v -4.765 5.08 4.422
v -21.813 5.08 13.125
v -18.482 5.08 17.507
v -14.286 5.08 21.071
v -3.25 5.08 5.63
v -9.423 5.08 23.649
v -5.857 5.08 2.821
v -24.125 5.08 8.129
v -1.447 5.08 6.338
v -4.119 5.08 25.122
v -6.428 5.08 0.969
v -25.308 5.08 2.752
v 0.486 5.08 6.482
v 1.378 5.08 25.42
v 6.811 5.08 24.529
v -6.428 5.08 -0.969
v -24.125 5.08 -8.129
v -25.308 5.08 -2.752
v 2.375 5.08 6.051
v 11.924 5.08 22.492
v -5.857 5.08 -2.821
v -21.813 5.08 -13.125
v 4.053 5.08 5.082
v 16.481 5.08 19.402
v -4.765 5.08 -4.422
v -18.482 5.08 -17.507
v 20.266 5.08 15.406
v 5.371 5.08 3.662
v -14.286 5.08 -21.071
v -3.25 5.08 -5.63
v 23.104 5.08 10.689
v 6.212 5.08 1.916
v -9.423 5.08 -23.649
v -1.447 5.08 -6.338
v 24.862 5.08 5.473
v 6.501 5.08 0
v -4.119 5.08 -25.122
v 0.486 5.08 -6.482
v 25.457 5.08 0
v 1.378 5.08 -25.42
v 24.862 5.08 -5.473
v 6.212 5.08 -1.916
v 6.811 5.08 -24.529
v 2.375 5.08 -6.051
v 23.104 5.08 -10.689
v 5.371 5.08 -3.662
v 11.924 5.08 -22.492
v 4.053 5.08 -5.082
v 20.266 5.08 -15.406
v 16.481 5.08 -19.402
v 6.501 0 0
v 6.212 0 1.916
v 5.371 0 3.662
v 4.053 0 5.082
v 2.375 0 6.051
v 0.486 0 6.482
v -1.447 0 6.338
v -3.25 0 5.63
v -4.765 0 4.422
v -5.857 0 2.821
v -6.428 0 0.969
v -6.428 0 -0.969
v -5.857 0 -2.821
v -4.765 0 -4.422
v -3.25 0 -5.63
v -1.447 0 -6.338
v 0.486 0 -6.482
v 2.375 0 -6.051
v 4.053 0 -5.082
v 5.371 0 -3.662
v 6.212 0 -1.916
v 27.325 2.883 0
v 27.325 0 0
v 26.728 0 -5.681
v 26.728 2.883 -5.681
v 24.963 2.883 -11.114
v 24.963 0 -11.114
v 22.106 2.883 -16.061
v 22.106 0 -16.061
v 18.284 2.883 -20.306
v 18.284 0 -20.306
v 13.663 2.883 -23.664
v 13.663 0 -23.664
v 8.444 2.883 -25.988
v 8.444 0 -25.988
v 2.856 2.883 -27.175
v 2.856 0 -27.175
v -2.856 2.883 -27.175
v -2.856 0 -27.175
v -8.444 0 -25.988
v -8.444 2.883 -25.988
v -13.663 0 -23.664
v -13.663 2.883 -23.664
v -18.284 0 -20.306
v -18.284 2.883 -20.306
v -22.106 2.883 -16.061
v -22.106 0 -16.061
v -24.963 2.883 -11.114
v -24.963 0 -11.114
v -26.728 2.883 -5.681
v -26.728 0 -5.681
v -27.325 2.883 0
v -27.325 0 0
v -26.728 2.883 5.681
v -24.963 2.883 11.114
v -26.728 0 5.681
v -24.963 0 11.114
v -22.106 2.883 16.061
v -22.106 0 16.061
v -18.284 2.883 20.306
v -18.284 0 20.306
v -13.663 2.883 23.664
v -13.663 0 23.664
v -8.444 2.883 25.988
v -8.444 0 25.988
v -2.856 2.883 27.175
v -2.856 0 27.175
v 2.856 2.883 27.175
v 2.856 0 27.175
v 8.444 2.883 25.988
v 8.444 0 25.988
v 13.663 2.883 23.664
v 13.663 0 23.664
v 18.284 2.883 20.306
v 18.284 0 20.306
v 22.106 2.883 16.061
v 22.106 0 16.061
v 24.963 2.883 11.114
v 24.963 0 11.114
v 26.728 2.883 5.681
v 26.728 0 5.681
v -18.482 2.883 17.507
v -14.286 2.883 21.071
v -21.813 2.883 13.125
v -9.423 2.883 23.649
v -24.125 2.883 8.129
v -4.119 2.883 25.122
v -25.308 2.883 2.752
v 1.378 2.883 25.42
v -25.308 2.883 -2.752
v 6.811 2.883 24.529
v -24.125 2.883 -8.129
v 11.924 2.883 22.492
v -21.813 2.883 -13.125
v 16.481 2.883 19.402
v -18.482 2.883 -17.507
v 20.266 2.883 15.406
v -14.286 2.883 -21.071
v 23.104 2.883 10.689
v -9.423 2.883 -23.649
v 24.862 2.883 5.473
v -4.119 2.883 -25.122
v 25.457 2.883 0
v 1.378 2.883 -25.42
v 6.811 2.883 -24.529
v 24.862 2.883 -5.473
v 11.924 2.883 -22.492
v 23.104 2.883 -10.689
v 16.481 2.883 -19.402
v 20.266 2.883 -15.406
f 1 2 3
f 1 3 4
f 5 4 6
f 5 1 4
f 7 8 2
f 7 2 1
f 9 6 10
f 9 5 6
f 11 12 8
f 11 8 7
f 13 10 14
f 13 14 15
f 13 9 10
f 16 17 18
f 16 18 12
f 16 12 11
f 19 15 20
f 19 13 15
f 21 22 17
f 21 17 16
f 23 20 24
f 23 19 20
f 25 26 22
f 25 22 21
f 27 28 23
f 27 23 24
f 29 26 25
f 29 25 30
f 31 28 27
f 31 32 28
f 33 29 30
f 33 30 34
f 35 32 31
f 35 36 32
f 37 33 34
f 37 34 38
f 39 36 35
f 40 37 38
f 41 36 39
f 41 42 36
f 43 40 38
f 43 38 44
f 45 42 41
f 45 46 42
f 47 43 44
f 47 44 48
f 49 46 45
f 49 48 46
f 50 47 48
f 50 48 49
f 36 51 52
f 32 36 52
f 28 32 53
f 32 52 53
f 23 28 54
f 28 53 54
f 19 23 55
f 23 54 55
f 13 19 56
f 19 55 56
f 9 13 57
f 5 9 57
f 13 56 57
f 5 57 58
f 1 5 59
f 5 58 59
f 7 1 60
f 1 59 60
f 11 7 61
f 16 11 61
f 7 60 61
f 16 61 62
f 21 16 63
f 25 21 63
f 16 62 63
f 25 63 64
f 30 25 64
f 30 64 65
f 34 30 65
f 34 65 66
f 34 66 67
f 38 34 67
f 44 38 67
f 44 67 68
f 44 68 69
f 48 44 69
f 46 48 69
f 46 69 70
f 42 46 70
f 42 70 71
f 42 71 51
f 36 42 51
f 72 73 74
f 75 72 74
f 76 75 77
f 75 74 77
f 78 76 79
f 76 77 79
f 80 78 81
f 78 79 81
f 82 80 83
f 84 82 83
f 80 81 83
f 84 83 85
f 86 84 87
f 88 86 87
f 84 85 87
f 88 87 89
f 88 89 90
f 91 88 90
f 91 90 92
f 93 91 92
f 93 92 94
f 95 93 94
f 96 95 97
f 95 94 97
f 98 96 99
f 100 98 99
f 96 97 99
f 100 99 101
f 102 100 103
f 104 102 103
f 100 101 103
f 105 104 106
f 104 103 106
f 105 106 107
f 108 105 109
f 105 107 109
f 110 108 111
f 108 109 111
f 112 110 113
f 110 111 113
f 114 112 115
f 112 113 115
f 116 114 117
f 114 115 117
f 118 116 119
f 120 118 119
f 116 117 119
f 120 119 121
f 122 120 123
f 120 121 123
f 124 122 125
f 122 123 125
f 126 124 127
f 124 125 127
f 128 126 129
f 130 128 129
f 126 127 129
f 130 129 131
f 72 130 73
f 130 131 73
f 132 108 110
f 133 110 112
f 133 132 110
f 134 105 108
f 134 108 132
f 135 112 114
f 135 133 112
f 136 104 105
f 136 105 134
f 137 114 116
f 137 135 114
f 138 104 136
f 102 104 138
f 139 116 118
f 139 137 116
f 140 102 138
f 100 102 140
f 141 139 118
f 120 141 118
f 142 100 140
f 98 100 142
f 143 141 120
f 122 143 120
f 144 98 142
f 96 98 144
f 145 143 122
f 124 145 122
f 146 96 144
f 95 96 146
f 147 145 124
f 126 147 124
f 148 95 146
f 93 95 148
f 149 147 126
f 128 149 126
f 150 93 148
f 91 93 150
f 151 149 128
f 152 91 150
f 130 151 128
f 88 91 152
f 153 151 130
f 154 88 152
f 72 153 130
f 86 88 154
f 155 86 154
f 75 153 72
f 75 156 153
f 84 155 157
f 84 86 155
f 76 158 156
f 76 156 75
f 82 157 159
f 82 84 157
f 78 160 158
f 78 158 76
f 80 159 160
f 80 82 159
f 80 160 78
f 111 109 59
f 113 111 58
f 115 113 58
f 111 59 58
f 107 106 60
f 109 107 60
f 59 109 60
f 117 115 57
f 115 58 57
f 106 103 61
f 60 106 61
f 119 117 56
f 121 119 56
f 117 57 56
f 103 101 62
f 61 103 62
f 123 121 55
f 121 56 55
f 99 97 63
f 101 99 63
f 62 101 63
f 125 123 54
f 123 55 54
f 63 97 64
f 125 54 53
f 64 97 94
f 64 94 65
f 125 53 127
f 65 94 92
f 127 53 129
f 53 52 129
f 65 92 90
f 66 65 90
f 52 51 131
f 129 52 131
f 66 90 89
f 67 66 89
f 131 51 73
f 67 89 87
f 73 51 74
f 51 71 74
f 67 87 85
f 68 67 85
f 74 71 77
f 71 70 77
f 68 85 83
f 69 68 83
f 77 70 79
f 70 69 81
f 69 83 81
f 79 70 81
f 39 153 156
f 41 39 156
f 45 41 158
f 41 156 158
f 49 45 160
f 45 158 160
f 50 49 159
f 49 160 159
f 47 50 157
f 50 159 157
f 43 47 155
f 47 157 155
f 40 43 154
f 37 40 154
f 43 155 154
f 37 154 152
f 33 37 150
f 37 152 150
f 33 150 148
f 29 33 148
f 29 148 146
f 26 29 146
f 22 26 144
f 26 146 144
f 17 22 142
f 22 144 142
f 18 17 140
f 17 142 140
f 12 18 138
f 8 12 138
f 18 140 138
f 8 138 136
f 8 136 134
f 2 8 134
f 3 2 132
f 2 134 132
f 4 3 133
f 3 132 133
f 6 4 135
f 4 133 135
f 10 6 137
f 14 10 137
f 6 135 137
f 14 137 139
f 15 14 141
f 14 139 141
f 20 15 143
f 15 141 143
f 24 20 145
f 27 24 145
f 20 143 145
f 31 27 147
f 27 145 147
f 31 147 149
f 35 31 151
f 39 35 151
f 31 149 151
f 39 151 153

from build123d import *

# Parameters (mm, degrees)
SKETCH1_R           = 27.325
BOSS_EXTRUDE1_DEPTH = 2.8829
SKETCH2_R           = 25.45715
BOSS_EXTRUDE2_DEPTH = 2.1971
SKETCH6_R           = 6.500596607
CUT_EXTRUDE1_DEPTH  = 25.4


with BuildPart() as part:
    # Sketch1 → Boss-Extrude1 (new body)
    with BuildSketch(Plane(origin=(0, 0, 0), x_dir=(1, 0, 0), z_dir=(0, 1, 0))):
        Circle(SKETCH1_R)
    extrude(amount=BOSS_EXTRUDE1_DEPTH)

    # Sketch2 → Boss-Extrude2 (add)
    with BuildSketch(Plane(origin=(0, 2.8829, 0), x_dir=(1, 0, 0), z_dir=(0, 1, 0))):
        Circle(SKETCH2_R)
    extrude(amount=BOSS_EXTRUDE2_DEPTH)

    # Sketch6 → Cut-Extrude1 (cut)
    with BuildSketch(Plane.XZ):
        Circle(SKETCH6_R)
    extrude(amount=-CUT_EXTRUDE1_DEPTH, mode=Mode.SUBTRACT)


solid = part.part
